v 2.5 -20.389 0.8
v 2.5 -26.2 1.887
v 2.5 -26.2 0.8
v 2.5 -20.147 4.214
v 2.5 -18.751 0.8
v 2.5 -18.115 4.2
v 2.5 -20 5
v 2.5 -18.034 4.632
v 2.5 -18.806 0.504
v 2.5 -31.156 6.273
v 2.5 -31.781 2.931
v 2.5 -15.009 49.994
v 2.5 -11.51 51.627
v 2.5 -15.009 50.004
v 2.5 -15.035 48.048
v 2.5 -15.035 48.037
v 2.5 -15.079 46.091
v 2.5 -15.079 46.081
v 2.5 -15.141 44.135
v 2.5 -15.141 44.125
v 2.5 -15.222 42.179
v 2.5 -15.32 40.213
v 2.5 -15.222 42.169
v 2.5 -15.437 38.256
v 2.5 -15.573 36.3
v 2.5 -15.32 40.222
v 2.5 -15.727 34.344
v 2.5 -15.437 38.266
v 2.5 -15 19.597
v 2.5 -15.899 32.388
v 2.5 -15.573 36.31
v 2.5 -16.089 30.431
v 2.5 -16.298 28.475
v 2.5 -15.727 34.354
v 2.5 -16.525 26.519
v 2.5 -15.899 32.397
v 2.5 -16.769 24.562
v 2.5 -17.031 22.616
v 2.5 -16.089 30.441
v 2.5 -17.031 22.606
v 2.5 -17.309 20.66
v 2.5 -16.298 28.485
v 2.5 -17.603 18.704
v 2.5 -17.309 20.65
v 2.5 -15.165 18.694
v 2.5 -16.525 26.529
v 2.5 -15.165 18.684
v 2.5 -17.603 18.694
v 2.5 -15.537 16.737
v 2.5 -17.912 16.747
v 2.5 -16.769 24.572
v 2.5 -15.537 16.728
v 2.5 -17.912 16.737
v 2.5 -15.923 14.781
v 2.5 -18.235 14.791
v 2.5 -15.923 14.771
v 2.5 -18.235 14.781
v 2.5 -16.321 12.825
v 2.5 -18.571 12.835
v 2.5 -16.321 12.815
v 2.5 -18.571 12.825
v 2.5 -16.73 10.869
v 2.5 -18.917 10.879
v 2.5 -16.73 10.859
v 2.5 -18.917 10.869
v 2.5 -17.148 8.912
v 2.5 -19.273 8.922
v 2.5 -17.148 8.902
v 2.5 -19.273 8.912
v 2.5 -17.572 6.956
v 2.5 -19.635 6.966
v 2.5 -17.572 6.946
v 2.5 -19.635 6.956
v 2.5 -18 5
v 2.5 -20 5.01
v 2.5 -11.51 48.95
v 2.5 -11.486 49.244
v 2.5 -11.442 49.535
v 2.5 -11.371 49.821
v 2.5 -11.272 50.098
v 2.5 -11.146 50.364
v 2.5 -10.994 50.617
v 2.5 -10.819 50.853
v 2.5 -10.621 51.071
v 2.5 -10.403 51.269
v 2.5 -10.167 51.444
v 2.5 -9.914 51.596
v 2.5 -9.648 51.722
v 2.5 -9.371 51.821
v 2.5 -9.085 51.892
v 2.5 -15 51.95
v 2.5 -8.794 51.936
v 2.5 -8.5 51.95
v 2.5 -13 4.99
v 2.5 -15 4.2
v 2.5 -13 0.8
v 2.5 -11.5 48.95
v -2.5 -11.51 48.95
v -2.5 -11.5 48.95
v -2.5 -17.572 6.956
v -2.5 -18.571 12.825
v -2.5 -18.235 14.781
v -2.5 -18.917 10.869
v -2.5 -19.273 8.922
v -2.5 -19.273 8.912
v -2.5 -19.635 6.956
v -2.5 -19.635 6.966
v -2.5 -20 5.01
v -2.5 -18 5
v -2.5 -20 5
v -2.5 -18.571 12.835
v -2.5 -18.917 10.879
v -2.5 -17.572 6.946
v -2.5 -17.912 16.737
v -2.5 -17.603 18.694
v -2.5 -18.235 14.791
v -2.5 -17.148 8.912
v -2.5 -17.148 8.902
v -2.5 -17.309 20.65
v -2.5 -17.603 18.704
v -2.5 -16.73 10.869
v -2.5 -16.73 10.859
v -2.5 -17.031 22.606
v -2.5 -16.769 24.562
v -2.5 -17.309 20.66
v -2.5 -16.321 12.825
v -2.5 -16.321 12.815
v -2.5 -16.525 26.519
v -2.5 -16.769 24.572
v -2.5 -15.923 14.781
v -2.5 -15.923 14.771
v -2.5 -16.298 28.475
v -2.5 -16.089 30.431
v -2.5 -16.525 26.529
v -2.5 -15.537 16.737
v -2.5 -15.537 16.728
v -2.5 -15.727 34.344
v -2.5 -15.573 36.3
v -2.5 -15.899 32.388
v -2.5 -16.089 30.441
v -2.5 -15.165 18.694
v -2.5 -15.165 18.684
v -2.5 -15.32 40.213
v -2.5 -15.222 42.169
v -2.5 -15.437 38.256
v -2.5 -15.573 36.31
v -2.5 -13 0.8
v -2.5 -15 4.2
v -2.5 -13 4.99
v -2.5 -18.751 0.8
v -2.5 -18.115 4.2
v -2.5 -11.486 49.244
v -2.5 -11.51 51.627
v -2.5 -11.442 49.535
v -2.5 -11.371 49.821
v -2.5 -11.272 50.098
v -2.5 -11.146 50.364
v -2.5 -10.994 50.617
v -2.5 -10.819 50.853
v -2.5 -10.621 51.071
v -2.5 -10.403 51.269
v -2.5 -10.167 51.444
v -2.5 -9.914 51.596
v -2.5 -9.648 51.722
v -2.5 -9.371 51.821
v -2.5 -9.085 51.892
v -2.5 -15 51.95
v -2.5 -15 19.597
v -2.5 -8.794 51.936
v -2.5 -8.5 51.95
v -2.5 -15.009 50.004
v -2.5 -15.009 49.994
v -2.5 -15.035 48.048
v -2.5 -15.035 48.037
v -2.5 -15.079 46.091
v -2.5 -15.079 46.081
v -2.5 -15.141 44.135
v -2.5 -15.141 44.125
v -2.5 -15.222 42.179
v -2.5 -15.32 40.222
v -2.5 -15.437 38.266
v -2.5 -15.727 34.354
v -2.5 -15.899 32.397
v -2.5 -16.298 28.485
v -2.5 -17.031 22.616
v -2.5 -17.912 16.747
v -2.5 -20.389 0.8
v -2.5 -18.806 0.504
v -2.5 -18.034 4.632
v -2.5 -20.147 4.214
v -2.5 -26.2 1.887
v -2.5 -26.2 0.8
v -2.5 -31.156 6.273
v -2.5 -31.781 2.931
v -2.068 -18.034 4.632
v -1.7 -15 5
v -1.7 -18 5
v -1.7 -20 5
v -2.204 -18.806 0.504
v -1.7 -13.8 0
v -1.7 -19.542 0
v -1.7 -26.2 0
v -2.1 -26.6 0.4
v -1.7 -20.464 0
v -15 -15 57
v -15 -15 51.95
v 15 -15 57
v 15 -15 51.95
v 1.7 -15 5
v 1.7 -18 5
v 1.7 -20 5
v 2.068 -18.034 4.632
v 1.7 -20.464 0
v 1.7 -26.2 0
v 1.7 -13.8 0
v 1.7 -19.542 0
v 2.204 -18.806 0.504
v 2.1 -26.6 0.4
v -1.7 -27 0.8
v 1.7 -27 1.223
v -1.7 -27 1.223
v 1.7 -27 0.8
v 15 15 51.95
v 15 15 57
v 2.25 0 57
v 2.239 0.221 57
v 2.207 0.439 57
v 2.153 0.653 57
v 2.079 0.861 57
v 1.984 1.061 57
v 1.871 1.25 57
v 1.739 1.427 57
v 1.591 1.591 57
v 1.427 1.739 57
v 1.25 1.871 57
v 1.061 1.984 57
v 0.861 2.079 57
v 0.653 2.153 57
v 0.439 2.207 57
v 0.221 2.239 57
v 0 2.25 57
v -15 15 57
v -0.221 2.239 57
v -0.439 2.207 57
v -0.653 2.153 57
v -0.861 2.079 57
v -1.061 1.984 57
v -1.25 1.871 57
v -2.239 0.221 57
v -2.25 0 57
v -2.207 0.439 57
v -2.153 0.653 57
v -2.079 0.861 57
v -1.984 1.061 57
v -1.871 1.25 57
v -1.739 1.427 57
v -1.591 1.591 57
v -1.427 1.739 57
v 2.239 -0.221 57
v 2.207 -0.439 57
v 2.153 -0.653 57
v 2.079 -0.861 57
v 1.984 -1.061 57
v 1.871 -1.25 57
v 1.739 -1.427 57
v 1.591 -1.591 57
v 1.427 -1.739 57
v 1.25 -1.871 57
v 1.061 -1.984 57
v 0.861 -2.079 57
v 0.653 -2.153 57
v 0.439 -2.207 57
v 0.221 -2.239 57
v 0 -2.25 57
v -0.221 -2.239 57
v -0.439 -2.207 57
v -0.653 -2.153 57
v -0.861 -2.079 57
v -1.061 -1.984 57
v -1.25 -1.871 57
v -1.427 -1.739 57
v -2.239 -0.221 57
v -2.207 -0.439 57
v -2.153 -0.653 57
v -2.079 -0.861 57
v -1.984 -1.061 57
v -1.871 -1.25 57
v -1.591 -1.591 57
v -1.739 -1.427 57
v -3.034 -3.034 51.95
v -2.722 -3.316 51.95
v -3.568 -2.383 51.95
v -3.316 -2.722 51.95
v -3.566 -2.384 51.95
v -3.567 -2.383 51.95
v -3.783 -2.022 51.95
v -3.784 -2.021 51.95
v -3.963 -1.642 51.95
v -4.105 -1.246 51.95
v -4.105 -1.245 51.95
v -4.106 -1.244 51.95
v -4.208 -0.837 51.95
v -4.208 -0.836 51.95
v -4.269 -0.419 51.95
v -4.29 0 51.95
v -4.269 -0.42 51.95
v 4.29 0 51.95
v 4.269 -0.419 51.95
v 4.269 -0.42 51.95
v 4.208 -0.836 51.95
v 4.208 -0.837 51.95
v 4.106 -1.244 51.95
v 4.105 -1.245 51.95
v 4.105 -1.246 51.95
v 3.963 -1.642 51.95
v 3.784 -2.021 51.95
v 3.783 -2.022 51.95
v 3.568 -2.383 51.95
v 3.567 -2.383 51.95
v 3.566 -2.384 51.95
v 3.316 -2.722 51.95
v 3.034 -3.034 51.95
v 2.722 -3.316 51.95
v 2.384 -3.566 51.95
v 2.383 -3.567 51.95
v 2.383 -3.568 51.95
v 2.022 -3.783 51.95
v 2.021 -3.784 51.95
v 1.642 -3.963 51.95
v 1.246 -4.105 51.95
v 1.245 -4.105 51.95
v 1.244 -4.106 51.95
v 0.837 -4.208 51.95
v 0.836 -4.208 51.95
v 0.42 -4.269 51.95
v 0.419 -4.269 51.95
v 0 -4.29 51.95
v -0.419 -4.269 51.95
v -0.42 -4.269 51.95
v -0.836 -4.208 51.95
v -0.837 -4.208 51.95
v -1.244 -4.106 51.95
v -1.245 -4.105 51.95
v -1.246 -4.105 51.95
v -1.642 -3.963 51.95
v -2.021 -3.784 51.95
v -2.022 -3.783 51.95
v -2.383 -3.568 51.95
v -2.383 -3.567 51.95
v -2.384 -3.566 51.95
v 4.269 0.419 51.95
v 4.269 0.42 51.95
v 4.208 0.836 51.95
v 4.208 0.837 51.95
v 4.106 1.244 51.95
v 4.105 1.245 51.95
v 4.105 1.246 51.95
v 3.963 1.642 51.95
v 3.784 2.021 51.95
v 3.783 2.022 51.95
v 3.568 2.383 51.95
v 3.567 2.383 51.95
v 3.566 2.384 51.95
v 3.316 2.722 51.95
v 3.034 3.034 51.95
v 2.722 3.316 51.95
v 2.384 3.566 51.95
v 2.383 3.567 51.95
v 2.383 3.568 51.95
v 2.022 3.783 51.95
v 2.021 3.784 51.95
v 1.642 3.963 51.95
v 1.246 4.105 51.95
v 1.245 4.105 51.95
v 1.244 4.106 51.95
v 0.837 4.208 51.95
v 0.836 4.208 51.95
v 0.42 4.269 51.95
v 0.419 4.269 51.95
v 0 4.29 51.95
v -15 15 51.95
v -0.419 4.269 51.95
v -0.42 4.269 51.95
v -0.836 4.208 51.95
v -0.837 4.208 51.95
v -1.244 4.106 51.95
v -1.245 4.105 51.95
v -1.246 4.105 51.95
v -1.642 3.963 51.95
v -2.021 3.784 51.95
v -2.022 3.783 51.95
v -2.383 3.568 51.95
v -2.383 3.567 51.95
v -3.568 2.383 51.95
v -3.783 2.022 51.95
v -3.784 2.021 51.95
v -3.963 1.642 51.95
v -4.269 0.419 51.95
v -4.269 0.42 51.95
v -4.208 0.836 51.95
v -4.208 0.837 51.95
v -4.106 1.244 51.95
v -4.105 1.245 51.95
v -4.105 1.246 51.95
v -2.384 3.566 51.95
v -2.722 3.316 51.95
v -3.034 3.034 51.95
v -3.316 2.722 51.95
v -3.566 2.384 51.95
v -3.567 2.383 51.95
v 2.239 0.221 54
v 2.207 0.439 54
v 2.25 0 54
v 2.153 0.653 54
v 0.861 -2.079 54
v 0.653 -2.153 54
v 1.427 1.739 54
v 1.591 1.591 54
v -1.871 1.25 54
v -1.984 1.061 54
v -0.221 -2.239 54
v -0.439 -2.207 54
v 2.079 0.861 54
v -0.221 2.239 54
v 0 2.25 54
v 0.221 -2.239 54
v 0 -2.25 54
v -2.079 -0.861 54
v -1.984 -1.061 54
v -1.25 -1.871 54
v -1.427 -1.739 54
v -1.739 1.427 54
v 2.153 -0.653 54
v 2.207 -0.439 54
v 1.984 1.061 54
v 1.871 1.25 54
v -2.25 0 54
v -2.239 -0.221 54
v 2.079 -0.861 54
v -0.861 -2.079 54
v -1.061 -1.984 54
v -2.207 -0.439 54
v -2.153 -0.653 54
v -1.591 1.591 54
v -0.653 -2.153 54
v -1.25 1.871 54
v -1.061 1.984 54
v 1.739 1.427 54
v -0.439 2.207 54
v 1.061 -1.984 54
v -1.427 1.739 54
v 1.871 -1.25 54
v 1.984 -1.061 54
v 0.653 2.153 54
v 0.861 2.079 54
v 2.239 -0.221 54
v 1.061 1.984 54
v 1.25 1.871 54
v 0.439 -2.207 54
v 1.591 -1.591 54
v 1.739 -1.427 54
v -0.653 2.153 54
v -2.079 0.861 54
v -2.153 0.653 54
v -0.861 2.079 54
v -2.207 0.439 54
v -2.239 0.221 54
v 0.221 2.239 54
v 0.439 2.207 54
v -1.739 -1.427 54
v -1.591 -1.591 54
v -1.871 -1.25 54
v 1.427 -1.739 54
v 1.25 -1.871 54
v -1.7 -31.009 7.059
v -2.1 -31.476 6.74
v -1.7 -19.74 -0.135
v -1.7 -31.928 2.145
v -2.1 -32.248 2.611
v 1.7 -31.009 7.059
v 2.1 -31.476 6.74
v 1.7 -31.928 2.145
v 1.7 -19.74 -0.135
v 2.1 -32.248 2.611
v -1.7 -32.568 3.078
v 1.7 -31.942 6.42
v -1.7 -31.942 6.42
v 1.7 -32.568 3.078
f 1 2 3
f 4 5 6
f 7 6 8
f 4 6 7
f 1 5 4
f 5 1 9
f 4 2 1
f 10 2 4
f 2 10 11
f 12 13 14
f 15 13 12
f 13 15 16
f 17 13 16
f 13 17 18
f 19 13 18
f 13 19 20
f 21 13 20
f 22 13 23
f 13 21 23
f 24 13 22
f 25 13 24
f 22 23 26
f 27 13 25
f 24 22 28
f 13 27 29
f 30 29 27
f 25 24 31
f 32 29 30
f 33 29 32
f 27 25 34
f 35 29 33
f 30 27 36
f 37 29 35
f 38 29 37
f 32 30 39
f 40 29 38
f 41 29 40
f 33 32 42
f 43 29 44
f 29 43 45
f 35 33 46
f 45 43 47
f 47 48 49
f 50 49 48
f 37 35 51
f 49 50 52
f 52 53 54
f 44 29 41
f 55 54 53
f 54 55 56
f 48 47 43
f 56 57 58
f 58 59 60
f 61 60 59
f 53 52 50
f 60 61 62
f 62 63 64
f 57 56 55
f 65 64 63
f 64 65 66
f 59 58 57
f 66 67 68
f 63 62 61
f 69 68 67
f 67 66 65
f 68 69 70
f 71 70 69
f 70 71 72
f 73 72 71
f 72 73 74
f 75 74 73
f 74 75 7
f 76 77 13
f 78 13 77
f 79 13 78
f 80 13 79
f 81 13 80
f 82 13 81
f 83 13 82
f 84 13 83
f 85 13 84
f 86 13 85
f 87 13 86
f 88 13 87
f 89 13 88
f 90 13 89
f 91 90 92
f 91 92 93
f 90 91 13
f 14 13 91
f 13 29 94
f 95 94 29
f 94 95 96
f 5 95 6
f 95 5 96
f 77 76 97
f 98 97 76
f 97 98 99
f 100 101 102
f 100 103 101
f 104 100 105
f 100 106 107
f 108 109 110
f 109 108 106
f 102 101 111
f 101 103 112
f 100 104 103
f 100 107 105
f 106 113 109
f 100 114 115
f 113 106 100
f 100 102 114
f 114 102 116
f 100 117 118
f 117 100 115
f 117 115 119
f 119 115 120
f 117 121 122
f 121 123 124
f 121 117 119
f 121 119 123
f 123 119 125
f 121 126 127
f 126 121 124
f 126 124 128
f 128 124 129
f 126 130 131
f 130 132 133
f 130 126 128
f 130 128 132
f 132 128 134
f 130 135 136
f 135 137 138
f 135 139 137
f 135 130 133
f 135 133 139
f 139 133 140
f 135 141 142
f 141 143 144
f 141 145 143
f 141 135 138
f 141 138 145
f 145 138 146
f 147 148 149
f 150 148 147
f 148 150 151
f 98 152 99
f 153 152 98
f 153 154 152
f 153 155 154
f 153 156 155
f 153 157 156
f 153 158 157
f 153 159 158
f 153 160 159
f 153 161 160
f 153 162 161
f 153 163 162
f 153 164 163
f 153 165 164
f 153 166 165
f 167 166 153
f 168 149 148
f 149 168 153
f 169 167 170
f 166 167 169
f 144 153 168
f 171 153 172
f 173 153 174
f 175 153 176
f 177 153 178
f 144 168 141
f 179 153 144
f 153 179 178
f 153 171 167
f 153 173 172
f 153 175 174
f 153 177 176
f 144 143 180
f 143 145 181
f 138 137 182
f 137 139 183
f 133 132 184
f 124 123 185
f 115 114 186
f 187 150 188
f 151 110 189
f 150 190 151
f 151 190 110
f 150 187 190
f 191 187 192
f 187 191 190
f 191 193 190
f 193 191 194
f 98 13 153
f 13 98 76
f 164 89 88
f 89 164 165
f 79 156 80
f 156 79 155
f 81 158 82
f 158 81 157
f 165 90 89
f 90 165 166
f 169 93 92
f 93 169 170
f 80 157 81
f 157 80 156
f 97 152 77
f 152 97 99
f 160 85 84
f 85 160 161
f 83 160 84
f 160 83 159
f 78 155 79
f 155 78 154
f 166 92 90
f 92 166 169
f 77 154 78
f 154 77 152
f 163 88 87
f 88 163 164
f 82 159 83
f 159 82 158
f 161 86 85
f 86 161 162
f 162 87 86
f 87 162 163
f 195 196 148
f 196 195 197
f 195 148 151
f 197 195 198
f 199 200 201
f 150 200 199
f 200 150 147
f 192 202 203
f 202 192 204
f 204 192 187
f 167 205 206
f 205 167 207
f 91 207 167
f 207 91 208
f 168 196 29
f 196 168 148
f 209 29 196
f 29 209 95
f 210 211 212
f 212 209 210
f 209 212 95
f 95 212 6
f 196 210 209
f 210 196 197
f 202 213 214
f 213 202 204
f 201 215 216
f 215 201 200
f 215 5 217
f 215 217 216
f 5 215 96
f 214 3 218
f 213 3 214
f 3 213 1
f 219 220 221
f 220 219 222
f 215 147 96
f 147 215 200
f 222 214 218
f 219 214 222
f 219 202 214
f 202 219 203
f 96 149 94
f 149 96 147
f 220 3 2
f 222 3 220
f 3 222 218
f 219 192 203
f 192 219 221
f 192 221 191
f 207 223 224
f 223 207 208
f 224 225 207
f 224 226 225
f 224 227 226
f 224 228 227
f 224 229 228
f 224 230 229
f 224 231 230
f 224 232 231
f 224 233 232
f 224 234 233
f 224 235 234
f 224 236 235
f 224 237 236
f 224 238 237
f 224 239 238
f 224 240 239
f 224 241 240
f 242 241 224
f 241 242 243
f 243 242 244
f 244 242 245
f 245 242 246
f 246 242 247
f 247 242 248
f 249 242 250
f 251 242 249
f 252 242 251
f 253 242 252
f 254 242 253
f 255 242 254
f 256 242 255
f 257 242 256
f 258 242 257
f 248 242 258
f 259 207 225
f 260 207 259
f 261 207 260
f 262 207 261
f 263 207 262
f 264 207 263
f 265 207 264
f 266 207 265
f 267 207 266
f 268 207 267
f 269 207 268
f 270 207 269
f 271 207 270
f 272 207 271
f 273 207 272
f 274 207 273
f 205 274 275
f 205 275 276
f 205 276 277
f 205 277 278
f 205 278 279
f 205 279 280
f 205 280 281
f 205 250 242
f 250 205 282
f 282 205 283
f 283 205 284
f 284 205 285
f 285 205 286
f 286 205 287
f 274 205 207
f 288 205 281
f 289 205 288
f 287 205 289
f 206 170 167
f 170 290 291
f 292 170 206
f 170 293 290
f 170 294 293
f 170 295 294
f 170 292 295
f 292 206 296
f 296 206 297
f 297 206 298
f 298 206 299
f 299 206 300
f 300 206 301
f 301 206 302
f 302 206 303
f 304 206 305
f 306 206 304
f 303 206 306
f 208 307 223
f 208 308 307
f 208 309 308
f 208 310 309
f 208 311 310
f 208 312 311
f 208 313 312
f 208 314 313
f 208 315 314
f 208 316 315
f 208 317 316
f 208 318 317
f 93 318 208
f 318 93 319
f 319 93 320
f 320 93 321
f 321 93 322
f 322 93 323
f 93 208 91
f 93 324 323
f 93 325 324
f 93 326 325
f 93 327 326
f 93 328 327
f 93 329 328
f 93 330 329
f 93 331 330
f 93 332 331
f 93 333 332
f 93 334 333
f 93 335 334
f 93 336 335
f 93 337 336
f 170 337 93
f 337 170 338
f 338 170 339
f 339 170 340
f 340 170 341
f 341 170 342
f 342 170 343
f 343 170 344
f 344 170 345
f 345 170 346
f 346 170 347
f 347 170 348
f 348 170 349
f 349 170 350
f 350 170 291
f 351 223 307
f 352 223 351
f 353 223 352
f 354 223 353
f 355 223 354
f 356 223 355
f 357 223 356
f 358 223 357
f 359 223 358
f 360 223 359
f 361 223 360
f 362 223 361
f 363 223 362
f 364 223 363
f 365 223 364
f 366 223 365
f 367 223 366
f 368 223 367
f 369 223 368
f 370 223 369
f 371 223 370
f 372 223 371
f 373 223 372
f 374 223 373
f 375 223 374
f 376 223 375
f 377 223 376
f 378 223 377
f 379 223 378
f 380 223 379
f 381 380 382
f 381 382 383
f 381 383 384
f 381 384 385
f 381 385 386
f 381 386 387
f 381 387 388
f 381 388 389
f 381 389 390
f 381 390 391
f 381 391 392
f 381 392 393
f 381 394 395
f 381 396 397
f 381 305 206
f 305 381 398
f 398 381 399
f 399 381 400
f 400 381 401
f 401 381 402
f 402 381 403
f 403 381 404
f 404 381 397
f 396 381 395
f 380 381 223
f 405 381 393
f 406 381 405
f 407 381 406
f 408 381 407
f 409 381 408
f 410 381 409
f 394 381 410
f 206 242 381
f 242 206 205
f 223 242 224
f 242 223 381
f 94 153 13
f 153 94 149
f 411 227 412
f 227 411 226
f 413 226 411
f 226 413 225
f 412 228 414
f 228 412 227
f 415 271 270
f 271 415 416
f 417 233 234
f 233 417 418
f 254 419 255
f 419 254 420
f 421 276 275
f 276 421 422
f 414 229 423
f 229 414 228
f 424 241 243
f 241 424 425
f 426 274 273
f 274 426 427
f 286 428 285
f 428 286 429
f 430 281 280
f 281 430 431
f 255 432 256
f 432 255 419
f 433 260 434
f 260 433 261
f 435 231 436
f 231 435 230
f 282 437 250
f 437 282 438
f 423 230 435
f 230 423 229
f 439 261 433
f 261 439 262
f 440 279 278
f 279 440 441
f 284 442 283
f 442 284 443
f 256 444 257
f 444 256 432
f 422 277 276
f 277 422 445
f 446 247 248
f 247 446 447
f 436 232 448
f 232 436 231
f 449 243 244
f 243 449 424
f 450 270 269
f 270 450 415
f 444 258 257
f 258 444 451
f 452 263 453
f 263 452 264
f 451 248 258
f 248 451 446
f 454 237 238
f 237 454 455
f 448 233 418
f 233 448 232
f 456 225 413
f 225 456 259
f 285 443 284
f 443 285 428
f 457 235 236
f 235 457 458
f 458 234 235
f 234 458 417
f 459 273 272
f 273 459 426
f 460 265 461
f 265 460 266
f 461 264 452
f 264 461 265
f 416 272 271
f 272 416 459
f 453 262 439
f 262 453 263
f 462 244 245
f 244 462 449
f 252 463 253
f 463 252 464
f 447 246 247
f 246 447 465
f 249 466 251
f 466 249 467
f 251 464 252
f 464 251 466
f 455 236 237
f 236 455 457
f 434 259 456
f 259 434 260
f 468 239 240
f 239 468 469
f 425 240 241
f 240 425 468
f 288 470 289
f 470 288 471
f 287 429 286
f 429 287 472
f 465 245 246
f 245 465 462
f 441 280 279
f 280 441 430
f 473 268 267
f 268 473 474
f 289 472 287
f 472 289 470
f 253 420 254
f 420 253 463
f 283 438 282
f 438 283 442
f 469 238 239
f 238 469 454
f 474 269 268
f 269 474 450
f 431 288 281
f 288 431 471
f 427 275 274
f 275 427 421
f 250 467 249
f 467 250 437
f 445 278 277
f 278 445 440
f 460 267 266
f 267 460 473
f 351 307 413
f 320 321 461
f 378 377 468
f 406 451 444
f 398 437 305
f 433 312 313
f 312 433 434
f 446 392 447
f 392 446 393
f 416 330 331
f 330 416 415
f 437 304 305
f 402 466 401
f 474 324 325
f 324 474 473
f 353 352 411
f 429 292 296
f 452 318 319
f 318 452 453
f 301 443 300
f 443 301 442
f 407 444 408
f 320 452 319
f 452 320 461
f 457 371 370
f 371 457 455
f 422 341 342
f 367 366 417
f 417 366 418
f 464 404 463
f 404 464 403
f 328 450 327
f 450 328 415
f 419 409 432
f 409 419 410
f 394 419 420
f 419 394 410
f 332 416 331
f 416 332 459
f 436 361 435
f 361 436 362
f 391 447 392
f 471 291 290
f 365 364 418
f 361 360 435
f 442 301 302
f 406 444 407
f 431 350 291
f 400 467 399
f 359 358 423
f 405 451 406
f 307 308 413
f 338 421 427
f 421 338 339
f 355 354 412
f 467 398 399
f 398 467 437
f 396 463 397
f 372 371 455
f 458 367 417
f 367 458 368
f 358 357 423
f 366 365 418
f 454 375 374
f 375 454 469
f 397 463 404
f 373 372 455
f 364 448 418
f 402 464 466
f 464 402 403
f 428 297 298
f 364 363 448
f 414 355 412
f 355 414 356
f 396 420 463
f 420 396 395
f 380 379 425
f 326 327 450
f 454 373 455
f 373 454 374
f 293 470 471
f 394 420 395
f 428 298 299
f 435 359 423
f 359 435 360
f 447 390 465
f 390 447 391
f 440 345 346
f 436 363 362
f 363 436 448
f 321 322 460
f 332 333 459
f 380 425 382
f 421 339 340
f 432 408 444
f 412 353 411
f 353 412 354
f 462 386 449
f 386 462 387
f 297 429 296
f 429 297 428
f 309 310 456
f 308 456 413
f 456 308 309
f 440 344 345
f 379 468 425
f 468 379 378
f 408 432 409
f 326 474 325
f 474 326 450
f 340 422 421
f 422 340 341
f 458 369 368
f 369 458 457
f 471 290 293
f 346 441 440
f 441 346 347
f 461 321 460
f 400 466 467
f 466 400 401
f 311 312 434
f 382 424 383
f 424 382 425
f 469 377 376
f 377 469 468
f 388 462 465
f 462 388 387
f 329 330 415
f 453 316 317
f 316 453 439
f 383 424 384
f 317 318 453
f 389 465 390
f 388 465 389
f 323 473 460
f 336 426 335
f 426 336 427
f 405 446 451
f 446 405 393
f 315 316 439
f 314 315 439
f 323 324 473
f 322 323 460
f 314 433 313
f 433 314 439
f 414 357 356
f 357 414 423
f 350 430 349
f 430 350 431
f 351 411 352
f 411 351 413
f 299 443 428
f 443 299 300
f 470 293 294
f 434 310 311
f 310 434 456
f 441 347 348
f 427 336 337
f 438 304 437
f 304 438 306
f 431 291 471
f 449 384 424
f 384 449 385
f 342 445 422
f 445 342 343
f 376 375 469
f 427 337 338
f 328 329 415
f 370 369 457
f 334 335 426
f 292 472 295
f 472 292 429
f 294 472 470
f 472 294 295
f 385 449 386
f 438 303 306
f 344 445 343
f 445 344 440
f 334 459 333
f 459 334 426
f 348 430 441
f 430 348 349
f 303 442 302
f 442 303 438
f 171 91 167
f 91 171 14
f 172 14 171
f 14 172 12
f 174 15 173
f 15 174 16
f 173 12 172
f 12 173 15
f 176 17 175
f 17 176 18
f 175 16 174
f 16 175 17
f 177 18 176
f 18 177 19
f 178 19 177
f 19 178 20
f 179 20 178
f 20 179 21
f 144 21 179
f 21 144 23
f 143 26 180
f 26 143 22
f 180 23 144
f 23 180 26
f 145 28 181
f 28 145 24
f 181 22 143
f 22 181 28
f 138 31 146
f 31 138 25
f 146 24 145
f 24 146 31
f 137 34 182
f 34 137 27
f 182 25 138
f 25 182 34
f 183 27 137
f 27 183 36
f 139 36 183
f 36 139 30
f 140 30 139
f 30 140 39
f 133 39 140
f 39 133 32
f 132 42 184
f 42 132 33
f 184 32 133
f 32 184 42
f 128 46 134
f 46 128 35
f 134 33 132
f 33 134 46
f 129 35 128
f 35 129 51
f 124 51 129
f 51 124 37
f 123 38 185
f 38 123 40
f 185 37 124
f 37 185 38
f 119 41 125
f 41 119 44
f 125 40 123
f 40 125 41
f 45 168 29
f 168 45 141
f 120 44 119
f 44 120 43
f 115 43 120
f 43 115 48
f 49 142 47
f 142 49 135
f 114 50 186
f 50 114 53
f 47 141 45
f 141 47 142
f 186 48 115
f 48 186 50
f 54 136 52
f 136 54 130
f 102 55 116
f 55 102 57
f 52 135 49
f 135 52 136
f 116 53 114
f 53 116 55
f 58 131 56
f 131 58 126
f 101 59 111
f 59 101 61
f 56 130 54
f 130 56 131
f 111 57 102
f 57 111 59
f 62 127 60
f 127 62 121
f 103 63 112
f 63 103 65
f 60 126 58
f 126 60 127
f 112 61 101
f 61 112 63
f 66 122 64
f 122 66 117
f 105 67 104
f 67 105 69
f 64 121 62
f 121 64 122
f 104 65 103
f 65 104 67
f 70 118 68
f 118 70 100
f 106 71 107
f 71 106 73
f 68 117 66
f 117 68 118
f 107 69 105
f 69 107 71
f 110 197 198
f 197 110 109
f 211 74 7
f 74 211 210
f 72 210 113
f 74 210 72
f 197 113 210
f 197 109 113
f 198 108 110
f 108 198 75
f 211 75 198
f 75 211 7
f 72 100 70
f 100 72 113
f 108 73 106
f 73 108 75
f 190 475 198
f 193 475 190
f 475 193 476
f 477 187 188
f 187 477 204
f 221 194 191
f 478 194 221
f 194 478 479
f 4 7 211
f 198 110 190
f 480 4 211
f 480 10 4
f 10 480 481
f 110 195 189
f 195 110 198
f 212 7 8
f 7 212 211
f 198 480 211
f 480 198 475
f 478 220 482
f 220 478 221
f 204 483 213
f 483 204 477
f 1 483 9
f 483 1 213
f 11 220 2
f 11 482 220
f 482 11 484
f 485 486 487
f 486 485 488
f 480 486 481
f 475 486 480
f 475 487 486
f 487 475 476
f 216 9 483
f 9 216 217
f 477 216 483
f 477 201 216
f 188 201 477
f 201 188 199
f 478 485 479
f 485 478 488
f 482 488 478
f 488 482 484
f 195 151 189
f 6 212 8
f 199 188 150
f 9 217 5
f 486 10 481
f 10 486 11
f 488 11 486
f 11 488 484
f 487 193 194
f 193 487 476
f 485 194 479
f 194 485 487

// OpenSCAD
// file: catch_1piece.scad
// ============================================================
// Sliding screen catch - one-piece variant
// Plate screws to the frame above with one countersunk wood screw
// (head sits flush in the plate underside). The leg is a cantilever
// spring; push the foot forward (-Y) ~5 mm to release.
//
// Print: lying on its side, +X face on the bed, so the leg's length and
// its bending direction lie in the layer plane (layers never run across
// the spring). Needs support under the leg and foot only.
// This file renders in print orientation (catch_1piece_print);
// catch_1piece() is in installed coordinates.
// ============================================================

include <catch1_common.scad>

echo(str("plate_t = ", plate_t, " mm, leg_h = ", leg_h,
         " mm; at ", release_flex, " mm flex: root strain = ",
         round(flex_strain * 1000) / 10, " %, push force = ",
         round(push_force * 10) / 10, " N"));

module plate() {
    translate([-plate_w/2, -plate_d/2, plate_bot_z])
        cube([plate_w, plate_d, plate_t]);
}

module screw_hole() {
    // shank
    translate([0, 0, plate_bot_z - 1]) cylinder(d = screw_d, h = plate_t + 2);
    // countersink cone, opening downward (screw driven up into the frame)
    translate([0, 0, plate_bot_z - 0.01])
        cylinder(d1 = screw_head_d, d2 = screw_d, h = csk_depth + 0.01);
}

// Tapered leg: front face flush with the plate edge, back face slopes
// from leg_t at the root to leg_t_tip at the foot.
module leg() {
    hull() {
        translate([-leg_w/2, leg_y0, plate_bot_z - 0.01]) cube([leg_w, leg_t, 0.02]);
        translate([-leg_w/2, leg_y0, foot_t - 0.01])      cube([leg_w, leg_t_tip, 0.02]);
    }
}

// Concave fillet in the corner between the leg's back face (+Y) and the
// plate underside - the side in tension when the foot is pushed forward.
module leg_fillet() {
    r = leg_fillet_r;
    y0 = leg_y0 + leg_t;
    translate([-leg_w/2, 0, 0])
        difference() {
            translate([0, y0 - 0.01, plate_bot_z - r]) cube([leg_w, r + 0.01, r + 0.01]);
            translate([-1, y0 + r, plate_bot_z - r]) rotate([0, 90, 0])
                cylinder(r = r, h = leg_w + 2);
        }
}

// Foot with every exposed edge chamfered by foot_bevel. Edges that run
// into the leg (top edges of the part under the leg) stay square so the
// leg's faces carry straight down into the foot.
module catch_foot() {
    c  = foot_bevel;
    y0 = foot_y0;  y1 = foot_y0 + foot_l;  w = foot_w / 2;  t = foot_t;
    intersection() {
        // side profile (Y-Z): front-top, front-bottom, back-bottom corners
        rotate([90, 0, 90]) translate([0, 0, -w - 1]) linear_extrude(foot_w + 2)
            polygon([[y0 + c, 0], [y1 - c, 0], [y1, c], [y1, t],
                     [y0 + c, t], [y0, t - c], [y0, c]]);
        // plan (X-Y): front vertical corners
        translate([0, 0, -1]) linear_extrude(t + 2)
            polygon([[-w, y0 + c], [-w + c, y0], [w - c, y0], [w, y0 + c],
                     [w, y1 + 1], [-w, y1 + 1]]);
        // cross-section (X-Z): bottom edges full length; top edges only in
        // front of the leg
        union() {
            translate([0, y0 - 1, 0]) rotate([-90, 0, 0]) mirror([0, 1, 0])
                linear_extrude(leg_y0 - y0 + 1)
                    polygon([[-w + c, 0], [w - c, 0], [w, c], [w, t - c],
                             [w - c, t], [-w + c, t], [-w, t - c], [-w, c]]);
            translate([0, leg_y0, 0]) rotate([-90, 0, 0]) mirror([0, 1, 0])
                linear_extrude(y1 - leg_y0 + 1)
                    polygon([[-w + c, 0], [w - c, 0], [w, c], [w, t + 1], [-w, t + 1], [-w, c]]);
        }
    }
}

module catch_1piece() {
    difference() {
        union() {
            plate();
            leg();
            leg_fillet();
            catch_foot();
        }
        screw_hole();
    }
}

// Print orientation: +X face on the bed (z = 0), installed Z runs along +X.
module catch_1piece_print() {
    translate([0, 0, plate_w/2]) rotate([0, 90, 0]) catch_1piece();
}

catch_1piece_print();
// file: catch1_common.scad
// ============================================================
// Sliding screen catch - ONE-PIECE variant: parameters
// Included by catch_1piece.scad and catch_1piece_print_plate.scad.
//
// Same envelope as the 2-piece design, but the plate screws straight to
// the frame above and the leg is a cantilever spring: push the foot
// forward (-Y) about 5 mm to release the screen.
//
// Coordinate system (installed position):
//   Origin at plate centre (X, Y), Z up, foot bottom at z = 0.
//   The frame is above: plate top face at z = total_h.
//   Front edge of the plate is -Y; the leg hangs from it.
// ============================================================

$fn = 64;

// ---- Plate (screws to the frame) ----
plate_w      = 30;   // plate size, X
plate_d      = 30;   // plate size, Y
screw_meat   = 3;    // solid material between countersink bottom and frame face

// ---- Leg (flex spring) ----
leg_w        = 5;    // leg width, X (stiff direction) - same as 2-piece
leg_t        = 3.5;  // leg thickness at the root, Y (flex direction) // guess
leg_t_tip    = 2.0;  // leg thickness at the foot - linear taper spreads the strain along the leg // guess
leg_fillet_r = 3;    // fillet at the leg root, back (tension) side // guess
release_flex = 5;    // foot travel needed to release the catch

// ---- Material: PLA ----
mat_E        = 3300; // MPa, PLA printed with layers along the leg // guess (typical 3000-3500)
max_strain   = 0.01; // allowed peak strain for repeated flexing in PLA (yield ~2-3 %, brittle)

// ---- Foot ----
foot_w       = 5;    // foot width, X
foot_proj    = 12;   // how far the foot sticks out in front of the leg
foot_t       = 5;    // foot thickness, Z
foot_bevel   = 0.8;  // 45-degree chamfer on the foot's outside edges // guess

total_h      = 57;   // bottom of foot to frame face - overall installed height

// ---- Wood screw (#8 / ~4 mm flat head) ----
screw_d      = 4.5;  // shank clearance hole
screw_head_d = 8.6;  // countersink diameter at the surface
screw_csk_angle = 90; // included angle (82 for US imperial screws, 90 metric)

// ---- Derived ----
csk_depth    = (screw_head_d - screw_d) / 2 / tan(screw_csk_angle / 2);   // ~2.05
plate_t      = csk_depth + screw_meat;      // ~5.05, countersunk from below
plate_bot_z  = total_h - plate_t;
leg_h        = plate_bot_z - foot_t;        // flexing length, ~46.95
foot_l       = foot_proj + leg_t_tip;       // total foot length incl. the part under the leg
front_y      = -plate_d / 2;
leg_y0       = front_y;                     // leg flush with front edge
foot_y0      = leg_y0 + leg_t_tip - foot_l; // foot projects forward (-Y)

// ---- Flex analysis (tapered cantilever, point load at the foot) ----
// s = distance down from the leg root (0 .. leg_h).
function leg_t_at(s) = leg_t + (leg_t_tip - leg_t) * s / leg_h;
function leg_I(s)    = leg_w * pow(leg_t_at(s), 3) / 12;
flex_n = 200;        // integration steps
// compliance: sum over the leg of (L - x)(s - x) / I(x) for x < s
function _c(s, i = 0) = i >= flex_n ? 0 :
    let(x = (i + 0.5) * s / flex_n)
    (leg_h - x) * (s - x) / leg_I(x) * s / flex_n + _c(s, i + 1);
push_force   = release_flex * mat_E / _c(leg_h);              // N, to push the foot 5 mm
function leg_defl(s) = push_force / mat_E * _c(s);            // mm, deflected shape
flex_strain  = push_force * leg_h * (leg_t / 2) / (mat_E * leg_I(0));  // peak, at the root
assert(flex_strain <= max_strain,
       str("leg root strain ", flex_strain, " exceeds max_strain - thin or taper the leg"));
// main file
// ============================================================
// Preview only: the one-piece catch at rest (orange) and with the leg
// pushed forward by release_flex (translucent), approximating the bent
// leg as a cantilever curve. Not for printing.
// ============================================================

include <catch1_common.scad>
use <catch_1piece.scad>

color("Orange") catch_1piece();

// Deflected leg: tapered cantilever under tip load (leg_defl from
// catch1_common.scad), s measured down from the root. Drawn as stacked slices.
n = 24;
function defl(s) = leg_defl(s);
function slope(s) = (leg_defl(s) - leg_defl(s - 0.5)) / 0.5;
color("SteelBlue", 0.5) {
    for (i = [0 : n - 1]) {
        s0 = leg_h * i / n; s1 = leg_h * (i + 1) / n;
        hull() {
            translate([-leg_w/2, leg_y0 - defl(s0), plate_bot_z - s0 - 0.01]) cube([leg_w, leg_t_at(s0), 0.01]);
            translate([-leg_w/2, leg_y0 - defl(s1), plate_bot_z - s1]) cube([leg_w, leg_t_at(s1), 0.01]);
        }
    }
    // foot carried along, rotated by the tip slope
    translate([0, leg_y0 - defl(leg_h), foot_t])
        rotate([-atan(slope(leg_h)), 0, 0])
            translate([0, -leg_y0, -foot_t]) catch_foot();
}
